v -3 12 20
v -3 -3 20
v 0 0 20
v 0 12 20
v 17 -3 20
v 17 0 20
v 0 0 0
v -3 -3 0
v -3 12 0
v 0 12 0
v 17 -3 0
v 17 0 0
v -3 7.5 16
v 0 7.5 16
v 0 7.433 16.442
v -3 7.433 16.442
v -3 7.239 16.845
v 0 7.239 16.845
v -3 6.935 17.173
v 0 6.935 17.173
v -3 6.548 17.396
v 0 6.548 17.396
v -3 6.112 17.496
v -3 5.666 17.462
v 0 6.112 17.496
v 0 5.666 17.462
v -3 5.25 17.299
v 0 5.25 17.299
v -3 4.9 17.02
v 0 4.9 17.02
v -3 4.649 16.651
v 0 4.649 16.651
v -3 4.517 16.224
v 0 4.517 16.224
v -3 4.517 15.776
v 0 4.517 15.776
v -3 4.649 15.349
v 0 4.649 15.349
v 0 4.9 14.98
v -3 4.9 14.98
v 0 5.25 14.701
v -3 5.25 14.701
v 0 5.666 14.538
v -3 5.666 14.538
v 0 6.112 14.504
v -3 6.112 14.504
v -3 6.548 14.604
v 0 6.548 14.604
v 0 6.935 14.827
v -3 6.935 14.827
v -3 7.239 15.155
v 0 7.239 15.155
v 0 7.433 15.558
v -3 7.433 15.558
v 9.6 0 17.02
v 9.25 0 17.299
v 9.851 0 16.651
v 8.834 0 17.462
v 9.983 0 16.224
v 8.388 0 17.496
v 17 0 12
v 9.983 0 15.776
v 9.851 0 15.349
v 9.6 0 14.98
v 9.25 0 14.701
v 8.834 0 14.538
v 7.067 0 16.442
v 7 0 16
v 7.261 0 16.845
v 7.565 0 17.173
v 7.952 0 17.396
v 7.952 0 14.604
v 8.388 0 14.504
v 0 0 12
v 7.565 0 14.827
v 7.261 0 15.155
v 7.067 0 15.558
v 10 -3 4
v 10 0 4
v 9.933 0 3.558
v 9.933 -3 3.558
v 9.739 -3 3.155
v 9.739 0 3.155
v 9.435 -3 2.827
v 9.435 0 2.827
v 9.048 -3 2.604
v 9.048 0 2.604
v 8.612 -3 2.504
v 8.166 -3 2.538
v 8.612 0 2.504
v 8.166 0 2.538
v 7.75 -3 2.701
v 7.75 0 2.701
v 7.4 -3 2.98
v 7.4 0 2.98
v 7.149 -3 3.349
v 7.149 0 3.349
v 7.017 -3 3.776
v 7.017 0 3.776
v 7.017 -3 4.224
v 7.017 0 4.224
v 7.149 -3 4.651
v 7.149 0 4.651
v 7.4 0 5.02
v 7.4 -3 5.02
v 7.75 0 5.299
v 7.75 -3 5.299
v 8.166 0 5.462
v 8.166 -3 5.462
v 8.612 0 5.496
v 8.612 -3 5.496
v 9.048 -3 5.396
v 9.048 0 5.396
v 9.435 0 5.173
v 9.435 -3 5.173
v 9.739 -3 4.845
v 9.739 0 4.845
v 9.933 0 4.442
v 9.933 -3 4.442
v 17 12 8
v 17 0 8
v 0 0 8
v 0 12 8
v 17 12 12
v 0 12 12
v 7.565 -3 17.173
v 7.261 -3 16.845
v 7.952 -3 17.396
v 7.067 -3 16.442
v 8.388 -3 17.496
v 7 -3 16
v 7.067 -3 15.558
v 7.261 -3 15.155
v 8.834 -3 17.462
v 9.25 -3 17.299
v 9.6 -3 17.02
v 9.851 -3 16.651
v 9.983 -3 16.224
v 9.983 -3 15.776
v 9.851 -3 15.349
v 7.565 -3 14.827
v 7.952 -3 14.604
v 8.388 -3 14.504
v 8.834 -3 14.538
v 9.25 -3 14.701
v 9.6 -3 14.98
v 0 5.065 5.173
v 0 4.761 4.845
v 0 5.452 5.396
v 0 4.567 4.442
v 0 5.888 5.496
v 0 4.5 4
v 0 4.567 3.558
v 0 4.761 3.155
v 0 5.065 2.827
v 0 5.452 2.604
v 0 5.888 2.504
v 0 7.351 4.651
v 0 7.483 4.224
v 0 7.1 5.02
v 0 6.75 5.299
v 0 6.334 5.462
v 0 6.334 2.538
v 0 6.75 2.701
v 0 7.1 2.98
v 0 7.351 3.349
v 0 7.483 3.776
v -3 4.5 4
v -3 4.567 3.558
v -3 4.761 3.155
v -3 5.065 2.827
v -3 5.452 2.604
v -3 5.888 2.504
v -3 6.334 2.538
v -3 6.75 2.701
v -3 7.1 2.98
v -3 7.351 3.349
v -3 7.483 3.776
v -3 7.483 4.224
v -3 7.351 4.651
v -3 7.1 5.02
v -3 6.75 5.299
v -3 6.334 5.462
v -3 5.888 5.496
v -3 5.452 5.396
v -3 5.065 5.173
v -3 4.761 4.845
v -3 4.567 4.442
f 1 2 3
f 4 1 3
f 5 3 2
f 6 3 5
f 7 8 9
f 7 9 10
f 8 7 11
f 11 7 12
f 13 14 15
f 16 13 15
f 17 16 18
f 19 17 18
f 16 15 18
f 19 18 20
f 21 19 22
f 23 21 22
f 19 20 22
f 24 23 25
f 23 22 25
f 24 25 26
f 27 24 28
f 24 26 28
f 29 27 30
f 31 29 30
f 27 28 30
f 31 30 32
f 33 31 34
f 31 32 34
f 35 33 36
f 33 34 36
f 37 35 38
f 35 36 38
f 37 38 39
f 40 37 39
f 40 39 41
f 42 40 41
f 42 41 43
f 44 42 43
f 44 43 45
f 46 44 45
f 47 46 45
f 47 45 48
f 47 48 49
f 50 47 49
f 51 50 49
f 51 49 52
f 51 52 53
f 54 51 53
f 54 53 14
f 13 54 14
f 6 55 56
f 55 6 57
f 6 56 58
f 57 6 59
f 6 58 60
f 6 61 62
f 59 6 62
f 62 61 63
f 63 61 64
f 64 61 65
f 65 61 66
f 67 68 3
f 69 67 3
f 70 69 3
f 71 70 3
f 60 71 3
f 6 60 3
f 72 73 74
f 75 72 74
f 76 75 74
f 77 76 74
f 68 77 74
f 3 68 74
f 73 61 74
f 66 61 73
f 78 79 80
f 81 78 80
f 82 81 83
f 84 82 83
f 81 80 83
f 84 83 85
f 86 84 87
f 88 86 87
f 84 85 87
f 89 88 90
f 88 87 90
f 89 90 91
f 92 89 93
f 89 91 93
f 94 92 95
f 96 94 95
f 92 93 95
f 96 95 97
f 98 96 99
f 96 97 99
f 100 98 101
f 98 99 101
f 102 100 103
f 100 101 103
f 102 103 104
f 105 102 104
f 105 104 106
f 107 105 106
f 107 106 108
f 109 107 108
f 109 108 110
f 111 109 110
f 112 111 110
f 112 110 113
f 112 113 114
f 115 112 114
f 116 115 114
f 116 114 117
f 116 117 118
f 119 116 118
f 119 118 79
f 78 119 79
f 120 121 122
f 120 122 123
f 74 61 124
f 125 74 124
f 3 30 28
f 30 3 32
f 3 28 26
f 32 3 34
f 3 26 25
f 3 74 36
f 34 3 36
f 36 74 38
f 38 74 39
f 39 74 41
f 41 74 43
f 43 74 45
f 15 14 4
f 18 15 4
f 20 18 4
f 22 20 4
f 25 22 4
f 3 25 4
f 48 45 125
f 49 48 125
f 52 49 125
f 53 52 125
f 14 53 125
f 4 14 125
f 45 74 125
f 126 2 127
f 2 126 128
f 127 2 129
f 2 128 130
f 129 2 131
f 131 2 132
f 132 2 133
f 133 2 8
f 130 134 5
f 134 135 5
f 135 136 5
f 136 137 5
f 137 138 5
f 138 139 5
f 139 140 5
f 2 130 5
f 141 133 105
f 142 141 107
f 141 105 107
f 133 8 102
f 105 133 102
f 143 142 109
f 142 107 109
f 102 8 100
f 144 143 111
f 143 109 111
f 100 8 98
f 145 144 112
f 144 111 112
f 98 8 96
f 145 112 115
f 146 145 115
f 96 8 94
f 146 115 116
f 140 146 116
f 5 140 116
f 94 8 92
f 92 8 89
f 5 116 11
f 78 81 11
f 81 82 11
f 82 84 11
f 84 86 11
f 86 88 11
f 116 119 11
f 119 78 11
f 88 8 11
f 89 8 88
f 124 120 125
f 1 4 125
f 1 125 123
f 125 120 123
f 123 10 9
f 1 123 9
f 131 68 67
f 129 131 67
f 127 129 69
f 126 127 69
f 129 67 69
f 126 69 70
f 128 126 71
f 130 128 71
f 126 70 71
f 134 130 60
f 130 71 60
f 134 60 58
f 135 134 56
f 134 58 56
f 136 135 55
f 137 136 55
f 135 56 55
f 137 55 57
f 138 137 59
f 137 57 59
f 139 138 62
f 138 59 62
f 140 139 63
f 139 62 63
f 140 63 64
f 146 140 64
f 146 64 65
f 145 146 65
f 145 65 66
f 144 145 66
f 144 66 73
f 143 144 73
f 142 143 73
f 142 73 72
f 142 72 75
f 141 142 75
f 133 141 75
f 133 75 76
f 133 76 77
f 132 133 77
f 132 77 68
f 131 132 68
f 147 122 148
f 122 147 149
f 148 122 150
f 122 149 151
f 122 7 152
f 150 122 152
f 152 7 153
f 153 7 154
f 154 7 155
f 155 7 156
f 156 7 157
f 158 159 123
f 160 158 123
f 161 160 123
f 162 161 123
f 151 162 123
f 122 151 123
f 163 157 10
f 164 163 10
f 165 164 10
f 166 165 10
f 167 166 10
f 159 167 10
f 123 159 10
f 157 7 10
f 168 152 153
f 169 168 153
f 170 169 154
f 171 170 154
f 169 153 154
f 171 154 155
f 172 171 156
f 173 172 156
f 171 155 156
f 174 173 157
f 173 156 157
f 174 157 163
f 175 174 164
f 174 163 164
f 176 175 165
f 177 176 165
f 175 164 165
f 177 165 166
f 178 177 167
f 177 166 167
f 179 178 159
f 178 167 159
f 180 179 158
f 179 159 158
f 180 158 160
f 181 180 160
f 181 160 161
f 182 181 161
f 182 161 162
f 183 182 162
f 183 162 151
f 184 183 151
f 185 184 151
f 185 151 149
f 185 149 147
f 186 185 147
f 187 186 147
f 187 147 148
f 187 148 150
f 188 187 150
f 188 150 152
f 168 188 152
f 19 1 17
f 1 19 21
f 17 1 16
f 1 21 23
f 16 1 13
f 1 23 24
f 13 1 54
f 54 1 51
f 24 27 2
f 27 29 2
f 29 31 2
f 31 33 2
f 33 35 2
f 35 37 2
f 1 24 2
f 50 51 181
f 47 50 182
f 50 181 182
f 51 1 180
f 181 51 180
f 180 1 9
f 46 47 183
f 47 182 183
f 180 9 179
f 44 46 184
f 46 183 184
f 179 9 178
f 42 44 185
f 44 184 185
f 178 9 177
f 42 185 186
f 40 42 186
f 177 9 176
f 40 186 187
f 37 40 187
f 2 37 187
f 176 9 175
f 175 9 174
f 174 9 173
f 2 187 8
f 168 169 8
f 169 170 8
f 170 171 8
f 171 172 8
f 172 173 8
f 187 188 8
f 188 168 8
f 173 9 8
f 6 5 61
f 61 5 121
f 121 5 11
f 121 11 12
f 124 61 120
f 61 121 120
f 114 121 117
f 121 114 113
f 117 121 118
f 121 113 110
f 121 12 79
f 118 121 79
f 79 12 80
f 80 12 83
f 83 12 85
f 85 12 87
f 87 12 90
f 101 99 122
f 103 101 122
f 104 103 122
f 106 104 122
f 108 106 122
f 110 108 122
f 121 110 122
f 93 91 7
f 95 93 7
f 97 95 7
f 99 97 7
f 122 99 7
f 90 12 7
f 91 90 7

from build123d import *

# Parameters (mm, degrees)
EXTRUDE_1_DEPTH     = 20
SKETCH_2_R          = 1.5
CUT_EXTRUDE_1_DEPTH = 29.861739379
SKETCH_3_R          = 1.5
CUT_EXTRUDE_2_DEPTH = 29.861739379
SKETCH_4_W          = 4
SKETCH_4_H          = 12
EXTRUDE_2_DEPTH     = 17


with BuildPart() as part:
    # 草图1 → 凸台-拉伸1 (new body)
    with BuildSketch(Plane.XY):
        Polygon((0, 0), (0, 12), (-3, 12), (-3, -3), (17, -3), (17, 0), align=None)
    extrude(amount=EXTRUDE_1_DEPTH)

    # 草图2 → 切除-拉伸1 (cut, through all)
    with BuildSketch(Plane(origin=(0, 0, 0), x_dir=(0, 0, -1), z_dir=(1, 0, 0))):
        with Locations(Location((-16, 6, 0), (0, 0, 90))):
            Circle(SKETCH_2_R)
        with Locations(Location((-4, 6, 0), (0, 0, 270))):
            Circle(SKETCH_2_R)
    extrude(amount=-CUT_EXTRUDE_1_DEPTH, mode=Mode.SUBTRACT)

    # 草图3 → 切除-拉伸2 (cut, through all)
    with BuildSketch(Plane(origin=(0, 0, 0), x_dir=(1, 0, 0), z_dir=(0, 1, 0))):
        with Locations(Location((8.5, -16, 0), (0, 0, 180))):
            Circle(SKETCH_3_R)
        with Locations((8.5, -4)):
            Circle(SKETCH_3_R)
    extrude(amount=-CUT_EXTRUDE_2_DEPTH, mode=Mode.SUBTRACT)

    # 草图4 → 凸台-拉伸2 (add)
    with BuildSketch(Plane(origin=(0, 0, 0), x_dir=(0, 0, -1), z_dir=(1, 0, 0))):
        with Locations((-10, 6)):
            Rectangle(SKETCH_4_W, SKETCH_4_H)
    extrude(amount=EXTRUDE_2_DEPTH)


solid = part.part
